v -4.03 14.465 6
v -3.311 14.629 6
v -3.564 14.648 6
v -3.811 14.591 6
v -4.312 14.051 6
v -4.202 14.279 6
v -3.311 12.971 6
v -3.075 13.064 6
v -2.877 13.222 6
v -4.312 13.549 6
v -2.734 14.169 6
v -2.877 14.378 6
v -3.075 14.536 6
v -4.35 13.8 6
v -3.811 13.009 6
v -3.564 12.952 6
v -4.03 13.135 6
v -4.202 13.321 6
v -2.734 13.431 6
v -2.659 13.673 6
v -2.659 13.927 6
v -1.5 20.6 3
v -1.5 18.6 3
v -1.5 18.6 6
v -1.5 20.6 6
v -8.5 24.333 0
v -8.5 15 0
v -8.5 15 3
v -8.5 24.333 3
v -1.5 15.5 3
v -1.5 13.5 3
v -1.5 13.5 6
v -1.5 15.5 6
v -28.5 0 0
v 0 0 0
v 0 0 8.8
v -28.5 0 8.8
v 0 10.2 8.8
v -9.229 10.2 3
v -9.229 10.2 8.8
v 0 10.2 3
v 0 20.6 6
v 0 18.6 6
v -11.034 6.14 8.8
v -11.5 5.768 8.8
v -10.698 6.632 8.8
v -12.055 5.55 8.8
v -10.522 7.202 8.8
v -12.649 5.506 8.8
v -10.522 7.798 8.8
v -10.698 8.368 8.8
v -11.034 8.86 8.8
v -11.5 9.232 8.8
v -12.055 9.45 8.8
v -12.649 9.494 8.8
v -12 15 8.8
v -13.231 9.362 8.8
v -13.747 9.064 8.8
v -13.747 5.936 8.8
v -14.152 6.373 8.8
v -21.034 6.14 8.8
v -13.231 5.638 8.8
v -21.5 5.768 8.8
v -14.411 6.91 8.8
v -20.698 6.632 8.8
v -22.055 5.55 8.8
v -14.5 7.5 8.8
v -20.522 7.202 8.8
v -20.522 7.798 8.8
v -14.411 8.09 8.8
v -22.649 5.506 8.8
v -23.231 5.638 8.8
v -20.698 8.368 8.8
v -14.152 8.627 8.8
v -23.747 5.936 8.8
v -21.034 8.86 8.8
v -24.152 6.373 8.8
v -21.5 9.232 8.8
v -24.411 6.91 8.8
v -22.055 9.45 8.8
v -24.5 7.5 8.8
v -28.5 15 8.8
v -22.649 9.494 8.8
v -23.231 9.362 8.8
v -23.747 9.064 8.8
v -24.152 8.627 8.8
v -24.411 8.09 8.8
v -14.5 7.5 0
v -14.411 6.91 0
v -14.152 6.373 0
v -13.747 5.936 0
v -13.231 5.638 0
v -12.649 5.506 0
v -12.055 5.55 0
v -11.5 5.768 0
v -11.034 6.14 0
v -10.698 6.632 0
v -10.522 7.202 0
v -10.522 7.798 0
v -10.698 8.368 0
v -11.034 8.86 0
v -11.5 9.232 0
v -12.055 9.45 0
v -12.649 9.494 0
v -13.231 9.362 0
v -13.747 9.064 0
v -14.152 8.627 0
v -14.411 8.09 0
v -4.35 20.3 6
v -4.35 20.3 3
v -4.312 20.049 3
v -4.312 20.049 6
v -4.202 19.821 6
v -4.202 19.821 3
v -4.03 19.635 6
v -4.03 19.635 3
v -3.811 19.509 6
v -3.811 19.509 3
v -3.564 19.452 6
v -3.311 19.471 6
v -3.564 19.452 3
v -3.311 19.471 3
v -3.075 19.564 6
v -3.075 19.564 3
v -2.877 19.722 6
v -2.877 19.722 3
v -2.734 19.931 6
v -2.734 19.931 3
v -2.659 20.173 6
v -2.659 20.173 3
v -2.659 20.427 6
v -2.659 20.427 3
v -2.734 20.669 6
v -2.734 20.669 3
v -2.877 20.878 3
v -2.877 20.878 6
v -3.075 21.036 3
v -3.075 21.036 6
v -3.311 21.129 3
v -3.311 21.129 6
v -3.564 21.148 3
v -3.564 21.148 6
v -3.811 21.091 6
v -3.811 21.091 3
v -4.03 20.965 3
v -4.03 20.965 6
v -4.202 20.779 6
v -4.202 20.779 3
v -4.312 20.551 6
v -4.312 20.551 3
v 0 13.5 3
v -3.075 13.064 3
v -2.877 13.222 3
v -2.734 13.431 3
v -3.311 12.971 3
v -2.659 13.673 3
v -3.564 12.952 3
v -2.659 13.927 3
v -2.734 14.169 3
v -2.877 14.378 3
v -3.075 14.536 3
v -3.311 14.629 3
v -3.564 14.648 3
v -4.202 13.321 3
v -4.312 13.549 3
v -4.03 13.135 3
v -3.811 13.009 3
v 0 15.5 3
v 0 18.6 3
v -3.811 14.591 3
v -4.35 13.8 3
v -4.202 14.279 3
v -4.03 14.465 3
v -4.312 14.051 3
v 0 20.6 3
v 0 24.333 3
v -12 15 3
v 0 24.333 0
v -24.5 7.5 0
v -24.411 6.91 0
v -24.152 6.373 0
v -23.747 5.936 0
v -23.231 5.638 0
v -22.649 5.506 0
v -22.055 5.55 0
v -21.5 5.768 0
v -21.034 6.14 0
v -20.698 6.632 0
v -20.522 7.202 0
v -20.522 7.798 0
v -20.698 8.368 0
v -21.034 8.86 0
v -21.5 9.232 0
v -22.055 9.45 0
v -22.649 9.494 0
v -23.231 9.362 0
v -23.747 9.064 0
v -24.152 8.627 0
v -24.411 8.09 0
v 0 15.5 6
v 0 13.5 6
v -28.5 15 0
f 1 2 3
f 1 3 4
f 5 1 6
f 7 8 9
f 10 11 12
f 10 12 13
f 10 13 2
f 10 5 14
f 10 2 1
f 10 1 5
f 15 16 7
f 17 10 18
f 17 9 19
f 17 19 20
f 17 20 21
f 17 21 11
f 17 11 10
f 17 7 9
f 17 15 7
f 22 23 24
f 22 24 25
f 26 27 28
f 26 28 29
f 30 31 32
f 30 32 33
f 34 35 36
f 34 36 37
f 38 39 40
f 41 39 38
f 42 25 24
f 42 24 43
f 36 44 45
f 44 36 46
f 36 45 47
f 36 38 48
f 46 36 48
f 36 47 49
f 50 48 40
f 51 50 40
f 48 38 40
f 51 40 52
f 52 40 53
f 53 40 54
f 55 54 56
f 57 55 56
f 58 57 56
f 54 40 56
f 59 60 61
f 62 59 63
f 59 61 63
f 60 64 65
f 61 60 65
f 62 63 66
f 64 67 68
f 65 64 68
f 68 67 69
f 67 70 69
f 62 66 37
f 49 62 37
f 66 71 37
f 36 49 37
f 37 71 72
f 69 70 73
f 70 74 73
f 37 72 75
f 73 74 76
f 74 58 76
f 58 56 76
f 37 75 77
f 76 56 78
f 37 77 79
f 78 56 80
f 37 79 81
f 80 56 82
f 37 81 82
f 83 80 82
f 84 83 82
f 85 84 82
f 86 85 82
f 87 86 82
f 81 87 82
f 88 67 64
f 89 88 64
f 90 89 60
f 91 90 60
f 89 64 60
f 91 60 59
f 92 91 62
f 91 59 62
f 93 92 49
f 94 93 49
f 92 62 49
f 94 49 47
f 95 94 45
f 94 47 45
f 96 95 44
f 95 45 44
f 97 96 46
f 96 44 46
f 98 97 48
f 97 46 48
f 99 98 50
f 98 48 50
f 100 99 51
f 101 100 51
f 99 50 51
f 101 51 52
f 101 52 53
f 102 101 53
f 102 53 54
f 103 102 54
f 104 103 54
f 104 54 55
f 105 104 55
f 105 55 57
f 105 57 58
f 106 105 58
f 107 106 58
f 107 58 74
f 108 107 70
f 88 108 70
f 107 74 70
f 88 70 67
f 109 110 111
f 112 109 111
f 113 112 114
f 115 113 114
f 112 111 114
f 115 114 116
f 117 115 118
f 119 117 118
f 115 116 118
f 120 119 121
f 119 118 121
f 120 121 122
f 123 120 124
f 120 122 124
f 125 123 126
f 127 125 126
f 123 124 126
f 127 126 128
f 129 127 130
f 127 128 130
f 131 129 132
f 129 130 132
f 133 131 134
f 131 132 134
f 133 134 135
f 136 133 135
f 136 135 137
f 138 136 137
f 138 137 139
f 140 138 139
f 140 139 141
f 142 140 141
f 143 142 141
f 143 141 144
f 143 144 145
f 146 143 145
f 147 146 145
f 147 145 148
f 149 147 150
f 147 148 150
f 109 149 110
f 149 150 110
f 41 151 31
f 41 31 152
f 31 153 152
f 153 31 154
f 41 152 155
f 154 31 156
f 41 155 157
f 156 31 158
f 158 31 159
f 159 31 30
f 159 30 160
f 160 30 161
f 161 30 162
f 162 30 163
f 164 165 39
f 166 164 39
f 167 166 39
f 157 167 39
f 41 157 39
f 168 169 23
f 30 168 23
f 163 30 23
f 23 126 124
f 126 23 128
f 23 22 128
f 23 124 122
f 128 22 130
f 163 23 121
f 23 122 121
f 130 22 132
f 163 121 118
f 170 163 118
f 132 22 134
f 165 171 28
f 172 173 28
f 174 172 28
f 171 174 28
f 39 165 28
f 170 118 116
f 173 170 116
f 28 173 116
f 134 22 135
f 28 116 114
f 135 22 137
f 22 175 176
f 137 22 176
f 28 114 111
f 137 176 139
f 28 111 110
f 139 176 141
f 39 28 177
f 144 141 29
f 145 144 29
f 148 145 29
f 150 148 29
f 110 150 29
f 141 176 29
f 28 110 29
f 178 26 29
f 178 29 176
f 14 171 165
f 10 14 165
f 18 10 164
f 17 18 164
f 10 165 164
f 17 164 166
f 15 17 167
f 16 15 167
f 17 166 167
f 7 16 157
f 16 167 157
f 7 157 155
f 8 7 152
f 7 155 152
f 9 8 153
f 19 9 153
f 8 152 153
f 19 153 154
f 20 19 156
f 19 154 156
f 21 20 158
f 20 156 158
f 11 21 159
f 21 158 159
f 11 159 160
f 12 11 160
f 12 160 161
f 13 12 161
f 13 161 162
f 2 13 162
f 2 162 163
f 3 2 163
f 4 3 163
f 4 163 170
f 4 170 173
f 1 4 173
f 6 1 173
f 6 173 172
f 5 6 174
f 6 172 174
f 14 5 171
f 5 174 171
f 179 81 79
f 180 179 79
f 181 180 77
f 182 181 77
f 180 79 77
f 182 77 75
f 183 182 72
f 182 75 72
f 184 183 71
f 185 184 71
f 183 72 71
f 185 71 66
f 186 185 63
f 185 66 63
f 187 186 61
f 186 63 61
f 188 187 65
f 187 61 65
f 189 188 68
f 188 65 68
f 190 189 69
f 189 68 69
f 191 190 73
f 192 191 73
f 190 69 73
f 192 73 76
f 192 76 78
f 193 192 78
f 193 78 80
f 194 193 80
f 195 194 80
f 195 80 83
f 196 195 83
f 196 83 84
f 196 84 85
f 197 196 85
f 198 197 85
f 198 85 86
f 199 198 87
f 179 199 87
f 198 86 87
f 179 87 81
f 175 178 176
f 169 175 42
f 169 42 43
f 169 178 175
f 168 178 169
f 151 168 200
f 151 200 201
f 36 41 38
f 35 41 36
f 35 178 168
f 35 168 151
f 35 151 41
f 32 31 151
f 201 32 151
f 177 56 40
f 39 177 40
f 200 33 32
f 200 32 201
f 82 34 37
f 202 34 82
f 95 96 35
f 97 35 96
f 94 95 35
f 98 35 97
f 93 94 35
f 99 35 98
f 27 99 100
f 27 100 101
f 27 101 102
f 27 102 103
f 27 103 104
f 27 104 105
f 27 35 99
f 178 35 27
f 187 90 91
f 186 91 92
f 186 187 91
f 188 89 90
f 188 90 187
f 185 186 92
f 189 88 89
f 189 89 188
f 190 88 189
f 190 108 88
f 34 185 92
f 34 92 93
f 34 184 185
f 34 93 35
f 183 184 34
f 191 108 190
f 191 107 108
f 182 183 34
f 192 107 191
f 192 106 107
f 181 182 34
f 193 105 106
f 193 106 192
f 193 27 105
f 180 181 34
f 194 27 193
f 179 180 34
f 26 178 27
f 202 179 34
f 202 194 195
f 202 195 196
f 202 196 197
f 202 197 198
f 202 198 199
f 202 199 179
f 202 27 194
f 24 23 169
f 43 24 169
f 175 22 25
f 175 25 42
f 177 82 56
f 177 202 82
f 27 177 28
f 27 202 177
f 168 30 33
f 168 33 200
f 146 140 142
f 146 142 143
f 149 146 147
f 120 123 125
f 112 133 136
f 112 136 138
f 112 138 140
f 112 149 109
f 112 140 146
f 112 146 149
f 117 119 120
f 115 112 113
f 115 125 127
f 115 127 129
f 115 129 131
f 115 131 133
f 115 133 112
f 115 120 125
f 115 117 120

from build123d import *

# Parameters (mm, degrees)
EXTRUDE_1_DEPTH     = 3
EXTRUDE_2_DEPTH     = 5.8
SKETCH_3_W          = 1.5
SKETCH_3_H          = 2
SKETCH_3_R          = 0.85
EXTRUDE_3_DEPTH     = 3
CUT_EXTRUDE_1_DEPTH = 8.8


with BuildPart() as part:
    # 草图1 → 凸台-拉伸1 (new body)
    with BuildSketch(Plane.XY):
        Polygon((0, 0), (-28.5, 0), (-28.5, 15), (-8.5, 15), (-8.5, 24.333), (0, 24.333), align=None)
    extrude(amount=EXTRUDE_1_DEPTH)

    # 草图2 → 凸台-拉伸2 (add)
    with BuildSketch(Plane.XY.offset(3)):
        Polygon((-12, 15), (-9.228718708, 10.2), (0, 10.2), (0, 0), (-28.5, 0), (-28.5, 15), align=None)
    extrude(amount=EXTRUDE_2_DEPTH)

    # 草图3 → 凸台-拉伸3 (add)
    with BuildSketch(Plane.XY.offset(3)):
        with Locations((-0.75, 19.6)):
            Rectangle(SKETCH_3_W, SKETCH_3_H)
        with Locations((-0.75, 14.5)):
            Rectangle(SKETCH_3_W, SKETCH_3_H)
        with Locations(Location((-3.5, 13.8, 0), (0, 0, 180))):
            Circle(SKETCH_3_R)
        with Locations(Location((-3.5, 20.3, 0), (0, 0, 180))):
            Circle(SKETCH_3_R)
    extrude(amount=EXTRUDE_3_DEPTH)

    # 草图5 → 切除-拉伸1 (cut)
    with BuildSketch(Plane.XY.offset(8.8)):
        with BuildLine():
            ThreePointArc((-20.5, 7.5), (-22.5, 9.5), (-24.5, 7.5))
            Line((-24.5, 7.5), (-20.5, 7.5))
        make_face()
        with BuildLine():
            Line((-20.5, 7.5), (-24.5, 7.5))
            ThreePointArc((-24.5, 7.5), (-22.5, 5.5), (-20.5, 7.5))
        make_face()
        with BuildLine():
            ThreePointArc((-10.5, 7.5), (-12.5, 9.5), (-14.5, 7.5))
            Line((-14.5, 7.5), (-10.5, 7.5))
        make_face()
        with BuildLine():
            Line((-10.5, 7.5), (-14.5, 7.5))
            ThreePointArc((-14.5, 7.5), (-12.5, 5.5), (-10.5, 7.5))
        make_face()
    extrude(amount=-CUT_EXTRUDE_1_DEPTH, mode=Mode.SUBTRACT)


solid = part.part
